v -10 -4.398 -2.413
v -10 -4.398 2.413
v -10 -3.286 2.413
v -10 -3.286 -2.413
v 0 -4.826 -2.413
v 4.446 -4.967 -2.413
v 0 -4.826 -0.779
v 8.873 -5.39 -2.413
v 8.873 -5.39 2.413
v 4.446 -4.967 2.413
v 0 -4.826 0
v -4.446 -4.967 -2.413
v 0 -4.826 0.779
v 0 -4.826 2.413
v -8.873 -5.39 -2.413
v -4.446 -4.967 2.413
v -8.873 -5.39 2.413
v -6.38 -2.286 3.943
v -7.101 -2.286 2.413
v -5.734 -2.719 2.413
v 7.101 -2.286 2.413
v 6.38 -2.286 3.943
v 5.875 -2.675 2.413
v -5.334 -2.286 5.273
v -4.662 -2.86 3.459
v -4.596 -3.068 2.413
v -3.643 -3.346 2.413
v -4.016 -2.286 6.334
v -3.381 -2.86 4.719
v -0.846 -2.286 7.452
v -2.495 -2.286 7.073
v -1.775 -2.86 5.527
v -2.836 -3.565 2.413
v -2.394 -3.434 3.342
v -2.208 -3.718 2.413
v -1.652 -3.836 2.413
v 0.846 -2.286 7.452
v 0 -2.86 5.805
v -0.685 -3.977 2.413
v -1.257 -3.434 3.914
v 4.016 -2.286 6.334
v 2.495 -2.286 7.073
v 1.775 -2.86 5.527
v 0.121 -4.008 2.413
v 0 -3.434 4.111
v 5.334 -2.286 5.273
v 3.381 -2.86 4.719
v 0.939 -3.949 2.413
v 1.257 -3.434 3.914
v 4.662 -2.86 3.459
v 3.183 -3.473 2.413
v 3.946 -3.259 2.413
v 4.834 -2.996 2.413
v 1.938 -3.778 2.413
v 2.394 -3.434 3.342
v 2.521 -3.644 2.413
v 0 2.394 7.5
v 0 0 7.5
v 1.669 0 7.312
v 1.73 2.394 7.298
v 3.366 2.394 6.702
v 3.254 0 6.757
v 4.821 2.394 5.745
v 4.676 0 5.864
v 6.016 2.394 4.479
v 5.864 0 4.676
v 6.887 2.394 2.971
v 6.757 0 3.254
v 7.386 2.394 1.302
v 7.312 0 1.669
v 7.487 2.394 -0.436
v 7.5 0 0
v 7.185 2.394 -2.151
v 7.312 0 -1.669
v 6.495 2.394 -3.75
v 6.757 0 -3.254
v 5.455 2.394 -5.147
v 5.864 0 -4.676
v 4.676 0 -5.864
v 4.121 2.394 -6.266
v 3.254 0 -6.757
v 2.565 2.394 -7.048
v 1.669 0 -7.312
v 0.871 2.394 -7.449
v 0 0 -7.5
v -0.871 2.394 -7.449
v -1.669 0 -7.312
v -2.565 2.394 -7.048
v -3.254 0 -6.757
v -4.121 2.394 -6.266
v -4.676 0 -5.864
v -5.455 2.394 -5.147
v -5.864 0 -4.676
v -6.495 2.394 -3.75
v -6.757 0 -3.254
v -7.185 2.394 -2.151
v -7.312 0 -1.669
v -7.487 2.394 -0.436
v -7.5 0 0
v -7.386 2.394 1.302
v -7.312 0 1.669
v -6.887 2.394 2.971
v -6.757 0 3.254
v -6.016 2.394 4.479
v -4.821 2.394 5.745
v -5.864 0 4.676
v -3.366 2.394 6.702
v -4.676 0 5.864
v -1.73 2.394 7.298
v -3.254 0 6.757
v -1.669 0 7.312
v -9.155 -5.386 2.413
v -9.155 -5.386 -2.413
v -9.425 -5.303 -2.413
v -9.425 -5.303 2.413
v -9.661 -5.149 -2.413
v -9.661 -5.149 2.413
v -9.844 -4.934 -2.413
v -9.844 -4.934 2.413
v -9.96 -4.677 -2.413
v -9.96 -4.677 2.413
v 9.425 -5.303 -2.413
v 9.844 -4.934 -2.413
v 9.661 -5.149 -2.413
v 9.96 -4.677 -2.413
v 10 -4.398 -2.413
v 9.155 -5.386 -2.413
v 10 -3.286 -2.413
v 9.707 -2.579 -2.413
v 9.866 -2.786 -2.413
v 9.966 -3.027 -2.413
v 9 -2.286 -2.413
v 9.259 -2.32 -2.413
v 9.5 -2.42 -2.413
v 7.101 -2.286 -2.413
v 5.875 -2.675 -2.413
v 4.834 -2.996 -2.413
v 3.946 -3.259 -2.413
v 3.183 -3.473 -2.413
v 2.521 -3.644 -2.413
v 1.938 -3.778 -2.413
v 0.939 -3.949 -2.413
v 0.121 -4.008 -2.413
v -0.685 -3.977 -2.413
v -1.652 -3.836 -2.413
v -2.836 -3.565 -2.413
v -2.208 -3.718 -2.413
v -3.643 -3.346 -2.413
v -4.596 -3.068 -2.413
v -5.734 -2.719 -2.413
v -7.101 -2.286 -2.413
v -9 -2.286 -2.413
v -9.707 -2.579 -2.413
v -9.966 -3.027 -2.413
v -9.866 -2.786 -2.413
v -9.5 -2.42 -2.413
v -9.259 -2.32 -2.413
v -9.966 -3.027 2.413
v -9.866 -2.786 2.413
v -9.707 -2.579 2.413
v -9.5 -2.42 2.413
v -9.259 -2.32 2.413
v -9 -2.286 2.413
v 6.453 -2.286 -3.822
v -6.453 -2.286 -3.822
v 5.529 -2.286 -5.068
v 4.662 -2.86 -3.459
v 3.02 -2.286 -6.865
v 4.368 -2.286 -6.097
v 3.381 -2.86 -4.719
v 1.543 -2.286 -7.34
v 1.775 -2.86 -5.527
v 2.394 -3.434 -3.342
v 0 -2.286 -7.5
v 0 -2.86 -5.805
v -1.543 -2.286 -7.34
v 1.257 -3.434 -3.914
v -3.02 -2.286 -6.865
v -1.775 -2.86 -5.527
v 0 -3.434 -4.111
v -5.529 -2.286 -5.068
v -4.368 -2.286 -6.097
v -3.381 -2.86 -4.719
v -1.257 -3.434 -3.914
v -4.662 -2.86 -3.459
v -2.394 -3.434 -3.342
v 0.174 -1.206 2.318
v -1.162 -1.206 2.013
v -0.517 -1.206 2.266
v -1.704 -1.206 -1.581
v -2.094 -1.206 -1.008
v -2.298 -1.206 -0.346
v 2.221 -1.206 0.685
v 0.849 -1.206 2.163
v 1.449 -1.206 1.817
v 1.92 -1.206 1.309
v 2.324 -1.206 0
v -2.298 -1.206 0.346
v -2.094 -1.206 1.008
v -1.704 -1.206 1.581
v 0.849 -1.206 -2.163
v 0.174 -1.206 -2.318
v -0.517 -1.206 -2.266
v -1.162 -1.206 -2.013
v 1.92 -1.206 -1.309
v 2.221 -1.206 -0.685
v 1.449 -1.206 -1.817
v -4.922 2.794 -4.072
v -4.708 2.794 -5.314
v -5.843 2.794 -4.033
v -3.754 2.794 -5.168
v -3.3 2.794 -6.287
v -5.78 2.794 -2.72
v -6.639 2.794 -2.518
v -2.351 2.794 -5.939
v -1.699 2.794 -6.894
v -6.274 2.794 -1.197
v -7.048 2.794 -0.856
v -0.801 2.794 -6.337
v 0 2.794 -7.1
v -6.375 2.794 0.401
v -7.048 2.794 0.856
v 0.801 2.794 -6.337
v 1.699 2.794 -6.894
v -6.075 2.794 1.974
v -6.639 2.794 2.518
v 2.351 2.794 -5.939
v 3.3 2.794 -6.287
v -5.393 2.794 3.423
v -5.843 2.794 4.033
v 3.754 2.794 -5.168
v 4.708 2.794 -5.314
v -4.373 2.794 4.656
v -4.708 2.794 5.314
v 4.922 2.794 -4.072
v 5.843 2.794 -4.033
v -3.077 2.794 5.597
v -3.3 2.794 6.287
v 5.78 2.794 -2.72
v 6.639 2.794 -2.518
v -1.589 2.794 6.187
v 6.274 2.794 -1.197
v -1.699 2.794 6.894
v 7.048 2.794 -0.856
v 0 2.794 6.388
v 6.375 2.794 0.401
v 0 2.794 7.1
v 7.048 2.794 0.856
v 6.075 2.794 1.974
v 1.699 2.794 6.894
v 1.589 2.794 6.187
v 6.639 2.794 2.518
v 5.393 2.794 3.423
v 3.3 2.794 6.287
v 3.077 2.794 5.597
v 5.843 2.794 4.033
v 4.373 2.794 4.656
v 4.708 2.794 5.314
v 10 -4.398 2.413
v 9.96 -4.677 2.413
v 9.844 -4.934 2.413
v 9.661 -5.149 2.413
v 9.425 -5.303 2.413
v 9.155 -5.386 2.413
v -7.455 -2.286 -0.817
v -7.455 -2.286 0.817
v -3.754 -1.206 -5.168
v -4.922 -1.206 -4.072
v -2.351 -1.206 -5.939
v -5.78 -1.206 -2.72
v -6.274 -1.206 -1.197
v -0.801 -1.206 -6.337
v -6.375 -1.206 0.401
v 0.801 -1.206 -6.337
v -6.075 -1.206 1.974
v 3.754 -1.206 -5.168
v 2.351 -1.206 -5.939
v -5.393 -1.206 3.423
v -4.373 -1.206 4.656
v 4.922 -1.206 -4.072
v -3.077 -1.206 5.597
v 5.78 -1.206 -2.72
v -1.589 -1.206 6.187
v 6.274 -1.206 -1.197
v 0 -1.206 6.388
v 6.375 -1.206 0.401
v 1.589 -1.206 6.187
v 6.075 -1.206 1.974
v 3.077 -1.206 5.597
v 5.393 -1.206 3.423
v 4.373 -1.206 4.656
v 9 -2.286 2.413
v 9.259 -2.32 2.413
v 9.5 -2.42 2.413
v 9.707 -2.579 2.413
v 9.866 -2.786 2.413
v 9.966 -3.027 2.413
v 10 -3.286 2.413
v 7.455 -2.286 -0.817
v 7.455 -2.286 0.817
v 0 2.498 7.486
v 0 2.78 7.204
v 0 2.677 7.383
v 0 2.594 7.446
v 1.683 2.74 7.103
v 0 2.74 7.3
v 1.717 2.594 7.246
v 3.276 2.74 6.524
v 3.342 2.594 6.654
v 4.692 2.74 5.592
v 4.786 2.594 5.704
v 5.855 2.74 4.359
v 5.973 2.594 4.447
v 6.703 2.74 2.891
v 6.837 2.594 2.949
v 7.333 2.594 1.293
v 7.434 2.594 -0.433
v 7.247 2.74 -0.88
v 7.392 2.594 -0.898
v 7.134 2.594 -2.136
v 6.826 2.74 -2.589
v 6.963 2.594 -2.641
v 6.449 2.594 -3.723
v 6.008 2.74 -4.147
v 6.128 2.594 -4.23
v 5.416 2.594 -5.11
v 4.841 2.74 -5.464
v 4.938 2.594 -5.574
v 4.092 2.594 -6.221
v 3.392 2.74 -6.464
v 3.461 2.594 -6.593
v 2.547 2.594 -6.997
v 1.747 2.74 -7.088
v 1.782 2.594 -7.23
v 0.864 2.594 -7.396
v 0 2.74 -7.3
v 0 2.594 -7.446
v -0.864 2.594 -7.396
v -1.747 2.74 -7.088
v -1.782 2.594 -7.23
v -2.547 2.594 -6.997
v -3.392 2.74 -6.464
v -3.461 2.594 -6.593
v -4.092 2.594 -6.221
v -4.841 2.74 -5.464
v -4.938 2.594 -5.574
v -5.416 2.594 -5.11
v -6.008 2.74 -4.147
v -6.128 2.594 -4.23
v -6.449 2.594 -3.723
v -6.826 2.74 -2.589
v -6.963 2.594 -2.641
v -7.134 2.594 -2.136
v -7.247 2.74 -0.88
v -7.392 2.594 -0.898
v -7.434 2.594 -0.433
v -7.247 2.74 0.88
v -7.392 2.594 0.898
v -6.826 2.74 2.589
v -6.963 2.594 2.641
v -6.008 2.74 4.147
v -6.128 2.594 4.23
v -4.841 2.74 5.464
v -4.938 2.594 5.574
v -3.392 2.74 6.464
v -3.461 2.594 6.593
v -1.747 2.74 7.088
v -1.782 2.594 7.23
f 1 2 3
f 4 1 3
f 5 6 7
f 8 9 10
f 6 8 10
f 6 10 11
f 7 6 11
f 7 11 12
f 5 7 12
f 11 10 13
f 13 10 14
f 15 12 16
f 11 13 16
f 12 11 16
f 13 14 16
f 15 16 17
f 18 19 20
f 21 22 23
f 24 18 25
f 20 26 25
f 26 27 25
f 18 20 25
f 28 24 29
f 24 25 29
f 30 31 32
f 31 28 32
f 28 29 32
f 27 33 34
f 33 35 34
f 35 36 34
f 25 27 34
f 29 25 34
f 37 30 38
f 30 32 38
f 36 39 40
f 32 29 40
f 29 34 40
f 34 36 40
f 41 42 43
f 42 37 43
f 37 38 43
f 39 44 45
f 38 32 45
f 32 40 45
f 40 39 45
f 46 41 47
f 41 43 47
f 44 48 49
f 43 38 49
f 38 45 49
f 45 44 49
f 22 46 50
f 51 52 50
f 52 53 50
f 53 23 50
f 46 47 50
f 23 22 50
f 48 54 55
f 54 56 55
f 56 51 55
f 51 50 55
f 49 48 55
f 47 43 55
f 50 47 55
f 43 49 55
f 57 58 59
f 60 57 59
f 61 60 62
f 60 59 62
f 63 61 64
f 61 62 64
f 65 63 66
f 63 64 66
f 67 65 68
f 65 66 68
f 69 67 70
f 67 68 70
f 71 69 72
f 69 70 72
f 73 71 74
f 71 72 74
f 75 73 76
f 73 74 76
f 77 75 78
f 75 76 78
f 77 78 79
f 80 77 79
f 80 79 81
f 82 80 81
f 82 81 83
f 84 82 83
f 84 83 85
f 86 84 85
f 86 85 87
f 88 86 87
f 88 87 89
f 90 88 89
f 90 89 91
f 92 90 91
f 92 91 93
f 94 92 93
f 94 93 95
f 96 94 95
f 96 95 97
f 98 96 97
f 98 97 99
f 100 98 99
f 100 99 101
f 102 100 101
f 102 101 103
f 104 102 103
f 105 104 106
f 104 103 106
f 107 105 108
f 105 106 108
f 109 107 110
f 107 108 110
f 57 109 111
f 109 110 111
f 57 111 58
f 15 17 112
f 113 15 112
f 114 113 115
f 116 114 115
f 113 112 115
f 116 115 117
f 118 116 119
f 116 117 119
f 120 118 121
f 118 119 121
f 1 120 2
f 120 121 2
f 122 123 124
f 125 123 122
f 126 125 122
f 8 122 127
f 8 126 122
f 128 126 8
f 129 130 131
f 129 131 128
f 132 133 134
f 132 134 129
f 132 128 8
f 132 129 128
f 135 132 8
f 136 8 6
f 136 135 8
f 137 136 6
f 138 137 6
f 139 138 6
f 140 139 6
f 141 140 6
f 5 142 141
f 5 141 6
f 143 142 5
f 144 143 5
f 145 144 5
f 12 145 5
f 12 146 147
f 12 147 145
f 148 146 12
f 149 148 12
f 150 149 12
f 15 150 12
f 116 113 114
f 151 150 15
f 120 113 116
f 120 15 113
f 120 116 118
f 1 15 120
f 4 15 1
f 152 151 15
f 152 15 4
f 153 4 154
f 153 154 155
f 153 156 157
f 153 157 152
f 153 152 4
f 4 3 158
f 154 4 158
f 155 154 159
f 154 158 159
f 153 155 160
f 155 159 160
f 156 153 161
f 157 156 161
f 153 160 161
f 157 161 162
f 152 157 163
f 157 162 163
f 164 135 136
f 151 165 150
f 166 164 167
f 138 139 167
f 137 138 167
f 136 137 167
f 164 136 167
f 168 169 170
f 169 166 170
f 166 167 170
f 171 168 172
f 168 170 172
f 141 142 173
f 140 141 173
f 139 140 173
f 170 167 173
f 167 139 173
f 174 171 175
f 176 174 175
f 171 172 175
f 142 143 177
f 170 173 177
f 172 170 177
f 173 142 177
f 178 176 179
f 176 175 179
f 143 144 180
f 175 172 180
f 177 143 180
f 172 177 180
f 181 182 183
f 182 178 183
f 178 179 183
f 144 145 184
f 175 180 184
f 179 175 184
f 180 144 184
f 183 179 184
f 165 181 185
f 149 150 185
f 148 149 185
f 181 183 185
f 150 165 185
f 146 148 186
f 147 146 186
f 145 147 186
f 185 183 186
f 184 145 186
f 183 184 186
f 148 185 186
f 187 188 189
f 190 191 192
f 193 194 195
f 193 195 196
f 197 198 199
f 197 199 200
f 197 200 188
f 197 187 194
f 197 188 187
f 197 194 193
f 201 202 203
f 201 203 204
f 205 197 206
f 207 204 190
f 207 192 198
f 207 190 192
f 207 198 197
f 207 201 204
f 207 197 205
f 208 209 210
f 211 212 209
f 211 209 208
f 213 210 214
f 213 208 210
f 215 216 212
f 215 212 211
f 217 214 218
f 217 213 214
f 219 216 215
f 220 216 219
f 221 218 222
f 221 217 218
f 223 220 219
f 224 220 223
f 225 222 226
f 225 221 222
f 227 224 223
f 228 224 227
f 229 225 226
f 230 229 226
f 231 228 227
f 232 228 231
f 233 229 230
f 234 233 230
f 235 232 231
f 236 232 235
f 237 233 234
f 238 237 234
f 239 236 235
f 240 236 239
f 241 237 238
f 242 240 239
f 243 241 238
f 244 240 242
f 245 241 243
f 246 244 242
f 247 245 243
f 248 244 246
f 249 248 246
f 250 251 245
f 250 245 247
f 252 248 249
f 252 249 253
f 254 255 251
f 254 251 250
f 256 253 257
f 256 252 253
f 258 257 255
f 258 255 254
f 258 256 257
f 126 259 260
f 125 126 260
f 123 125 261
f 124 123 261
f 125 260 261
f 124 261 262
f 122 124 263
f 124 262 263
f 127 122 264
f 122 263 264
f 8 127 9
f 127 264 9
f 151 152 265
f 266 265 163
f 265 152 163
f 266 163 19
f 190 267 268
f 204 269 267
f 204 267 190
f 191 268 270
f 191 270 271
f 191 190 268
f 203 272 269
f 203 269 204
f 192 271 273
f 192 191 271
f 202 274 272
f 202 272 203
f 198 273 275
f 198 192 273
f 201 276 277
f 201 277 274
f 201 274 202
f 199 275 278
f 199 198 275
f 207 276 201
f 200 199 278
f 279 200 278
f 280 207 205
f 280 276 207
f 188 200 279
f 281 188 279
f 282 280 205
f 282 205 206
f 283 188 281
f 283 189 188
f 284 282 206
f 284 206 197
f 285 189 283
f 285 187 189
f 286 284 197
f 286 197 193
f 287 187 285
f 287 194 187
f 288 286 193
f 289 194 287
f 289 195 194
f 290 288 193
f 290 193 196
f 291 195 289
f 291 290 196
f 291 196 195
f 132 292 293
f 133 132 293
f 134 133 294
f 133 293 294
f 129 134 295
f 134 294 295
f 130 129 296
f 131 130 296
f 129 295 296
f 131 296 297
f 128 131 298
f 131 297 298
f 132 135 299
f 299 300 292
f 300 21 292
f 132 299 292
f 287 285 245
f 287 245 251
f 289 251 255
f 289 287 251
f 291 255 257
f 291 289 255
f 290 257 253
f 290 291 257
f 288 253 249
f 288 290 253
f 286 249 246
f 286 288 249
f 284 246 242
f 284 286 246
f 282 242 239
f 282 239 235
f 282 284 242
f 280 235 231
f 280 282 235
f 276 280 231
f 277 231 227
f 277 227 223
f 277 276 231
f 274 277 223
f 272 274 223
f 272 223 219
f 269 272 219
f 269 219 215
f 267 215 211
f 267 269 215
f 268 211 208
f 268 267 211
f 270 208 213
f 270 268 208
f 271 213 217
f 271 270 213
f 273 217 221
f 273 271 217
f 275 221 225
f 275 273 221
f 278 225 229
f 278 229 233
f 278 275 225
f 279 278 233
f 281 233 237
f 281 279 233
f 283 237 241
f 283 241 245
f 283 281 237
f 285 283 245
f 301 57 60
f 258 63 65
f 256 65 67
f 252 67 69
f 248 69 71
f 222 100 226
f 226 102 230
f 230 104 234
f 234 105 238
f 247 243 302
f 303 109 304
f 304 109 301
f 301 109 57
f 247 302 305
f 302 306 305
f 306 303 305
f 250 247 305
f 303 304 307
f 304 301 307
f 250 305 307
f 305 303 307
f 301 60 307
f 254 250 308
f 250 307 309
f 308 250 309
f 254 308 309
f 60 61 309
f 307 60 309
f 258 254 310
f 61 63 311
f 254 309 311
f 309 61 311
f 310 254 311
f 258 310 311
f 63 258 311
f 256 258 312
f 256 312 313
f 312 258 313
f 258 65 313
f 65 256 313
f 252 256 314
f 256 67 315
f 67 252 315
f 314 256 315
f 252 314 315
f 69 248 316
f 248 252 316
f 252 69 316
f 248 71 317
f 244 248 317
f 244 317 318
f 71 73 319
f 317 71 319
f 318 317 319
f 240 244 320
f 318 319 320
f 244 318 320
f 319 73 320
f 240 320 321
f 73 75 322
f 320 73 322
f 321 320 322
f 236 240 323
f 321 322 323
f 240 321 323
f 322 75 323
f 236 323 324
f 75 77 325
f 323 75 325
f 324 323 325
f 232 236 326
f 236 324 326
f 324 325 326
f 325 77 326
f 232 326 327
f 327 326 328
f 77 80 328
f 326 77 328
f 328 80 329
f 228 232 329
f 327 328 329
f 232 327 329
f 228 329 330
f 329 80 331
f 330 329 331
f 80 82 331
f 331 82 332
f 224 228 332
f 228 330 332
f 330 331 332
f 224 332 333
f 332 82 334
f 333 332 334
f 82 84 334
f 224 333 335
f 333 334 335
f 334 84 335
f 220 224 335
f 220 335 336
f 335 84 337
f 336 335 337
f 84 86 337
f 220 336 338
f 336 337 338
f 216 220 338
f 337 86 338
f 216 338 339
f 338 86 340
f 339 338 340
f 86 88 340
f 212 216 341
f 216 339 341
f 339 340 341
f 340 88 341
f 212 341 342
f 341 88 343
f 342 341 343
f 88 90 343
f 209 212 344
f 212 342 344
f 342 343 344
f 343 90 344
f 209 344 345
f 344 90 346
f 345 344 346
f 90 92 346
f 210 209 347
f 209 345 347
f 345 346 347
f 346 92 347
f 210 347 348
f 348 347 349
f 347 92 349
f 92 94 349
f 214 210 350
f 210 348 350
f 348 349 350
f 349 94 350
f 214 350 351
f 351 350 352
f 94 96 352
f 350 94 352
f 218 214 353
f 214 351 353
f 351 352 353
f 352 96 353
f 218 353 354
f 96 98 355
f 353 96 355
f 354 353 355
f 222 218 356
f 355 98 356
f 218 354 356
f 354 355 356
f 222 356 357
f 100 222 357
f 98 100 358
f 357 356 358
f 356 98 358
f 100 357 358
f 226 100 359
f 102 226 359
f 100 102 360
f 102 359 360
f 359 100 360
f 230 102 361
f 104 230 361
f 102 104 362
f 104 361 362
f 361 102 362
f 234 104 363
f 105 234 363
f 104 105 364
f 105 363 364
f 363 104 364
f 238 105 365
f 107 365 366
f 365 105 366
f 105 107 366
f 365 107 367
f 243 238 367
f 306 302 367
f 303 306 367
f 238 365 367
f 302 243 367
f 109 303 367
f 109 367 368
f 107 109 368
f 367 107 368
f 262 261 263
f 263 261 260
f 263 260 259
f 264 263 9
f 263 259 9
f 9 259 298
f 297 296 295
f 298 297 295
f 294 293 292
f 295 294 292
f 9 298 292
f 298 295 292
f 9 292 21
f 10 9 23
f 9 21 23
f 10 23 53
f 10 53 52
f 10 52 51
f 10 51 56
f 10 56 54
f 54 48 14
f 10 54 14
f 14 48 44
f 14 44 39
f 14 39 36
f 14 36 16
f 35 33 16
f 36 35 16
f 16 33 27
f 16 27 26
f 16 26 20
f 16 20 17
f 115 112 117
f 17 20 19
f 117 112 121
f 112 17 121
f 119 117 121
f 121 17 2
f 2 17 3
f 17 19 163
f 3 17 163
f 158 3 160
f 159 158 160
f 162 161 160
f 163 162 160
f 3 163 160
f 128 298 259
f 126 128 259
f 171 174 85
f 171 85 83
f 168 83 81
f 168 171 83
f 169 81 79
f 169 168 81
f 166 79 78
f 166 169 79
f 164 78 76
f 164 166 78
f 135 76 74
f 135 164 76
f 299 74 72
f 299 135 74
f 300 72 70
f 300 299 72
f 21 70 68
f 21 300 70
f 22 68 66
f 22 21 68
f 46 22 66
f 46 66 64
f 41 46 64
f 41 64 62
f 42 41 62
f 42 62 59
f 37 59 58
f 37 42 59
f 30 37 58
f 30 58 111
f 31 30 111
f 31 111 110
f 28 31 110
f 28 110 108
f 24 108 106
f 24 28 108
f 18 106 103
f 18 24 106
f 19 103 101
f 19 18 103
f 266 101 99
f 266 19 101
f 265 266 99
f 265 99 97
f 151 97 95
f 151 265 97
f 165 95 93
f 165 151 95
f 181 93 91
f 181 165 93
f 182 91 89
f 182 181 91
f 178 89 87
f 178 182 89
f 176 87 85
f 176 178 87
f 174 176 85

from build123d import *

# Parameters (mm, degrees)
SKETCH1_R                = 7.5
SKETCH1_R_2              = 2.3241
BOSS_EXTRUDE1_DEPTH      = 2.794
SKETCH2_R                = 2.3241
BOSS_EXTRUDE2_DEPTH      = 0.254
BOSS_EXTRUDE3_DEPTH      = 1.651
BOSS_EXTRUDE4_START      = 2.286
SKETCH4_R                = 7.5
BOSS_EXTRUDE4_DEPTH      = 2.286
FILLET1_R                = 0.254
FILLET2_R                = 0.127
FILLET3_R                = 0.4
SKETCH6_W                = 4.02205745
SKETCH6_H                = 1.558094328
BOSS_EXTRUDE5_DEPTH      = 2.54
BOSS_EXTRUDE6_DEPTH      = 2.413
BOSS_EXTRUDE6_DEPTH_BACK = 2.413
CUT_EXTRUDE2_START       = -4
SKETCH5_R                = 6.3875
SKETCH5_R_2              = 2.3241
CUT_EXTRUDE2_DEPTH       = 4


with BuildPart() as part:
    # Sketch1 → Boss-Extrude1 (new body)
    with BuildSketch(Plane(origin=(0, 0, 0), x_dir=(1, 0, 0), z_dir=(0, 1, 0))):
        with Locations(Location((0, 0, 0), (0, 0, 270))):
            Circle(SKETCH1_R)
        with Locations(Location((0, 0, 0), (0, 0, 270))):
            Circle(SKETCH1_R_2, mode=Mode.SUBTRACT)
    extrude(amount=BOSS_EXTRUDE1_DEPTH)

    # Sketch2 → Boss-Extrude2 (add)
    with BuildSketch(Plane.XZ):
        with Locations(Location((0, 0, 0), (0, 0, 270))):
            Circle(SKETCH2_R)
    extrude(amount=-BOSS_EXTRUDE2_DEPTH)

    # Sketch3 → Boss-Extrude3 (add)
    with BuildSketch(Plane(origin=(0, 0.254, 0), x_dir=(1, 0, 0), z_dir=(0, 1, 0))):
        with BuildLine():
            Line((-0.495805164, 1.156686678), (0.614449488, 1.120298857))
            ThreePointArc((0.614449488, 1.120298857), (0.708812351, 1.091670316), (0.776218716, 1.01969584))
            Line((0.776218716, 1.01969584), (1.299833265, 0.039993196))
            ThreePointArc((1.299833265, 0.039993196), (1.322221652, -0.056041711), (1.293593111, -0.150404573))
            Line((1.293593111, -0.150404573), (0.706953007, -1.093719397))
            ThreePointArc((0.706953007, -1.093719397), (0.634978532, -1.161125762), (0.538943625, -1.183514149))
            Line((0.538943625, -1.183514149), (-0.571311028, -1.147126328))
            ThreePointArc((-0.571311028, -1.147126328), (-0.66567389, -1.118497787), (-0.733080255, -1.046523312))
            Line((-0.733080255, -1.046523312), (-1.256694804, -0.066820667))
            ThreePointArc((-1.256694804, -0.066820667), (-1.279083191, 0.02921424), (-1.25045465, 0.123577102))
            Line((-1.25045465, 0.123577102), (-0.663814546, 1.066891925))
            ThreePointArc((-0.663814546, 1.066891925), (-0.591840071, 1.134298291), (-0.495805164, 1.156686678))
        make_face()
    extrude(amount=BOSS_EXTRUDE3_DEPTH)

    # Sketch4 → Boss-Extrude4 (add)
    with BuildSketch(Plane.XZ.offset(BOSS_EXTRUDE4_START)):
        with Locations(Location((0, 0, 0), (0, 0, 270))):
            Circle(SKETCH4_R)
    extrude(amount=-BOSS_EXTRUDE4_DEPTH)

    # Fillet1
    fillet1_edges = [part.edges().sort_by_distance(p)[0] for p in [
        (0, 0.254, -2.3241),
        (0.708812351, 0.254, -1.091670316),
        (0.059322162, 0.254, -1.138492768),
        (-0.591840071, 0.254, -1.134298291),
        (-0.957134598, 0.254, -0.595234514),
        (-1.279083191, 0.254, -0.02921424),
        (-0.99488753, 0.254, 0.556671989),
        (-0.66567389, 0.254, 1.118497787),
        (-0.016183701, 0.254, 1.165320239),
        (0.634978532, 0.254, 1.161125762),
        (1.000273059, 0.254, 0.622061985),
        (1.322221652, 0.254, 0.056041711),
        (1.038025991, 0.254, -0.529844518),
    ]]
    fillet(fillet1_edges, radius=FILLET1_R)

    # Fillet2
    fillet2_edges = [part.edges().sort_by_distance(p)[0] for p in [
        (0.708812351, 1.905, -1.091670316),
        (0.059322162, 1.905, -1.138492768),
        (-0.591840071, 1.905, -1.134298291),
        (-0.957134598, 1.905, -0.595234514),
        (-1.279083191, 1.905, -0.02921424),
        (-0.99488753, 1.905, 0.556671989),
        (-0.66567389, 1.905, 1.118497787),
        (-0.016183701, 1.905, 1.165320239),
        (0.634978532, 1.905, 1.161125762),
        (1.000273059, 1.905, 0.622061985),
        (1.322221652, 1.905, 0.056041711),
        (1.038025991, 1.905, -0.529844518),
    ]]
    fillet(fillet2_edges, radius=FILLET2_R)

    # Fillet3
    fillet3_edges = [part.edges().sort_by_distance(p)[0] for p in [
        (0, 2.794, -7.5),
    ]]
    fillet(fillet3_edges, radius=FILLET3_R)

    # Sketch6 → Boss-Extrude5 (add)
    with BuildSketch(Plane.XZ.offset(2.286)):
        Rectangle(SKETCH6_W, SKETCH6_H)
    extrude(amount=BOSS_EXTRUDE5_DEPTH)

    # Sketch7 → Boss-Extrude6 (add, two sides: drawn at the far end of the back side and taken through both)
    with BuildSketch(Plane(origin=(0, 0, 0), x_dir=(-1, 0, 0), z_dir=(0, 0, -1)).offset(-BOSS_EXTRUDE6_DEPTH_BACK)):
        with BuildLine():
            Line((8.999999188, -2.286), (-8.999999188, -2.286))
            ThreePointArc((-8.999999188, -2.286), (-9.707105969, -2.578893219), (-9.999999188, -3.286))
            Line((-9.999999188, -3.286), (-9.999999188, -4.398115656))
            ThreePointArc((-9.999999188, -4.398115656), (-9.660822486, -5.148657173), (-8.873374049, -5.390066297))
            ThreePointArc((-8.873374049, -5.390066297), (0, -4.826), (8.873374049, -5.390066297))
            ThreePointArc((8.873374049, -5.390066297), (9.660822486, -5.148657173), (9.999999188, -4.398115656))
            Line((9.999999188, -4.398115656), (9.999999188, -3.286))
            ThreePointArc((9.999999188, -3.286), (9.707105969, -2.578893219), (8.999999188, -2.286))
        make_face()
    extrude(amount=BOSS_EXTRUDE6_DEPTH + BOSS_EXTRUDE6_DEPTH_BACK)

    # Sketch5 → Cut-Extrude2 (cut)
    # profile 1 of 2: a face of its own
    with BuildSketch(Plane(origin=(0, 2.794, 0), x_dir=(1, 0, 0), z_dir=(0, 1, 0)).offset(CUT_EXTRUDE2_START)):
        with Locations(Location((0, 0, 0), (0, 0, 270))):
            Circle(SKETCH5_R)
        Circle(SKETCH5_R_2, mode=Mode.SUBTRACT)
    # profile 2 of 2: a face of its own
    with BuildSketch(Plane(origin=(0, 2.794, 0), x_dir=(1, 0, 0), z_dir=(0, 1, 0)).offset(CUT_EXTRUDE2_START)):
        Circle(SKETCH5_R_2)
    extrude(amount=CUT_EXTRUDE2_DEPTH, mode=Mode.SUBTRACT)

    # Sketch11 → Revolve3 (revolve)
    with BuildSketch(Plane(origin=(0, 0, 0), x_dir=(-1, 0, 0), z_dir=(0, 0, -1)), mode=Mode.PRIVATE) as revolve3_sk:
        Polygon((-7.101227429, -2.286), (-7.5, -2.286), (0, -4.826), (0, -2.286), align=None)
    revolve(revolve3_sk.sketch.rotate(Axis((0, -1.206, 0), (0, 1, 0)), 18.767781972), axis=Axis((0, -1.206, 0), (0, 1, 0)))


solid = part.part
